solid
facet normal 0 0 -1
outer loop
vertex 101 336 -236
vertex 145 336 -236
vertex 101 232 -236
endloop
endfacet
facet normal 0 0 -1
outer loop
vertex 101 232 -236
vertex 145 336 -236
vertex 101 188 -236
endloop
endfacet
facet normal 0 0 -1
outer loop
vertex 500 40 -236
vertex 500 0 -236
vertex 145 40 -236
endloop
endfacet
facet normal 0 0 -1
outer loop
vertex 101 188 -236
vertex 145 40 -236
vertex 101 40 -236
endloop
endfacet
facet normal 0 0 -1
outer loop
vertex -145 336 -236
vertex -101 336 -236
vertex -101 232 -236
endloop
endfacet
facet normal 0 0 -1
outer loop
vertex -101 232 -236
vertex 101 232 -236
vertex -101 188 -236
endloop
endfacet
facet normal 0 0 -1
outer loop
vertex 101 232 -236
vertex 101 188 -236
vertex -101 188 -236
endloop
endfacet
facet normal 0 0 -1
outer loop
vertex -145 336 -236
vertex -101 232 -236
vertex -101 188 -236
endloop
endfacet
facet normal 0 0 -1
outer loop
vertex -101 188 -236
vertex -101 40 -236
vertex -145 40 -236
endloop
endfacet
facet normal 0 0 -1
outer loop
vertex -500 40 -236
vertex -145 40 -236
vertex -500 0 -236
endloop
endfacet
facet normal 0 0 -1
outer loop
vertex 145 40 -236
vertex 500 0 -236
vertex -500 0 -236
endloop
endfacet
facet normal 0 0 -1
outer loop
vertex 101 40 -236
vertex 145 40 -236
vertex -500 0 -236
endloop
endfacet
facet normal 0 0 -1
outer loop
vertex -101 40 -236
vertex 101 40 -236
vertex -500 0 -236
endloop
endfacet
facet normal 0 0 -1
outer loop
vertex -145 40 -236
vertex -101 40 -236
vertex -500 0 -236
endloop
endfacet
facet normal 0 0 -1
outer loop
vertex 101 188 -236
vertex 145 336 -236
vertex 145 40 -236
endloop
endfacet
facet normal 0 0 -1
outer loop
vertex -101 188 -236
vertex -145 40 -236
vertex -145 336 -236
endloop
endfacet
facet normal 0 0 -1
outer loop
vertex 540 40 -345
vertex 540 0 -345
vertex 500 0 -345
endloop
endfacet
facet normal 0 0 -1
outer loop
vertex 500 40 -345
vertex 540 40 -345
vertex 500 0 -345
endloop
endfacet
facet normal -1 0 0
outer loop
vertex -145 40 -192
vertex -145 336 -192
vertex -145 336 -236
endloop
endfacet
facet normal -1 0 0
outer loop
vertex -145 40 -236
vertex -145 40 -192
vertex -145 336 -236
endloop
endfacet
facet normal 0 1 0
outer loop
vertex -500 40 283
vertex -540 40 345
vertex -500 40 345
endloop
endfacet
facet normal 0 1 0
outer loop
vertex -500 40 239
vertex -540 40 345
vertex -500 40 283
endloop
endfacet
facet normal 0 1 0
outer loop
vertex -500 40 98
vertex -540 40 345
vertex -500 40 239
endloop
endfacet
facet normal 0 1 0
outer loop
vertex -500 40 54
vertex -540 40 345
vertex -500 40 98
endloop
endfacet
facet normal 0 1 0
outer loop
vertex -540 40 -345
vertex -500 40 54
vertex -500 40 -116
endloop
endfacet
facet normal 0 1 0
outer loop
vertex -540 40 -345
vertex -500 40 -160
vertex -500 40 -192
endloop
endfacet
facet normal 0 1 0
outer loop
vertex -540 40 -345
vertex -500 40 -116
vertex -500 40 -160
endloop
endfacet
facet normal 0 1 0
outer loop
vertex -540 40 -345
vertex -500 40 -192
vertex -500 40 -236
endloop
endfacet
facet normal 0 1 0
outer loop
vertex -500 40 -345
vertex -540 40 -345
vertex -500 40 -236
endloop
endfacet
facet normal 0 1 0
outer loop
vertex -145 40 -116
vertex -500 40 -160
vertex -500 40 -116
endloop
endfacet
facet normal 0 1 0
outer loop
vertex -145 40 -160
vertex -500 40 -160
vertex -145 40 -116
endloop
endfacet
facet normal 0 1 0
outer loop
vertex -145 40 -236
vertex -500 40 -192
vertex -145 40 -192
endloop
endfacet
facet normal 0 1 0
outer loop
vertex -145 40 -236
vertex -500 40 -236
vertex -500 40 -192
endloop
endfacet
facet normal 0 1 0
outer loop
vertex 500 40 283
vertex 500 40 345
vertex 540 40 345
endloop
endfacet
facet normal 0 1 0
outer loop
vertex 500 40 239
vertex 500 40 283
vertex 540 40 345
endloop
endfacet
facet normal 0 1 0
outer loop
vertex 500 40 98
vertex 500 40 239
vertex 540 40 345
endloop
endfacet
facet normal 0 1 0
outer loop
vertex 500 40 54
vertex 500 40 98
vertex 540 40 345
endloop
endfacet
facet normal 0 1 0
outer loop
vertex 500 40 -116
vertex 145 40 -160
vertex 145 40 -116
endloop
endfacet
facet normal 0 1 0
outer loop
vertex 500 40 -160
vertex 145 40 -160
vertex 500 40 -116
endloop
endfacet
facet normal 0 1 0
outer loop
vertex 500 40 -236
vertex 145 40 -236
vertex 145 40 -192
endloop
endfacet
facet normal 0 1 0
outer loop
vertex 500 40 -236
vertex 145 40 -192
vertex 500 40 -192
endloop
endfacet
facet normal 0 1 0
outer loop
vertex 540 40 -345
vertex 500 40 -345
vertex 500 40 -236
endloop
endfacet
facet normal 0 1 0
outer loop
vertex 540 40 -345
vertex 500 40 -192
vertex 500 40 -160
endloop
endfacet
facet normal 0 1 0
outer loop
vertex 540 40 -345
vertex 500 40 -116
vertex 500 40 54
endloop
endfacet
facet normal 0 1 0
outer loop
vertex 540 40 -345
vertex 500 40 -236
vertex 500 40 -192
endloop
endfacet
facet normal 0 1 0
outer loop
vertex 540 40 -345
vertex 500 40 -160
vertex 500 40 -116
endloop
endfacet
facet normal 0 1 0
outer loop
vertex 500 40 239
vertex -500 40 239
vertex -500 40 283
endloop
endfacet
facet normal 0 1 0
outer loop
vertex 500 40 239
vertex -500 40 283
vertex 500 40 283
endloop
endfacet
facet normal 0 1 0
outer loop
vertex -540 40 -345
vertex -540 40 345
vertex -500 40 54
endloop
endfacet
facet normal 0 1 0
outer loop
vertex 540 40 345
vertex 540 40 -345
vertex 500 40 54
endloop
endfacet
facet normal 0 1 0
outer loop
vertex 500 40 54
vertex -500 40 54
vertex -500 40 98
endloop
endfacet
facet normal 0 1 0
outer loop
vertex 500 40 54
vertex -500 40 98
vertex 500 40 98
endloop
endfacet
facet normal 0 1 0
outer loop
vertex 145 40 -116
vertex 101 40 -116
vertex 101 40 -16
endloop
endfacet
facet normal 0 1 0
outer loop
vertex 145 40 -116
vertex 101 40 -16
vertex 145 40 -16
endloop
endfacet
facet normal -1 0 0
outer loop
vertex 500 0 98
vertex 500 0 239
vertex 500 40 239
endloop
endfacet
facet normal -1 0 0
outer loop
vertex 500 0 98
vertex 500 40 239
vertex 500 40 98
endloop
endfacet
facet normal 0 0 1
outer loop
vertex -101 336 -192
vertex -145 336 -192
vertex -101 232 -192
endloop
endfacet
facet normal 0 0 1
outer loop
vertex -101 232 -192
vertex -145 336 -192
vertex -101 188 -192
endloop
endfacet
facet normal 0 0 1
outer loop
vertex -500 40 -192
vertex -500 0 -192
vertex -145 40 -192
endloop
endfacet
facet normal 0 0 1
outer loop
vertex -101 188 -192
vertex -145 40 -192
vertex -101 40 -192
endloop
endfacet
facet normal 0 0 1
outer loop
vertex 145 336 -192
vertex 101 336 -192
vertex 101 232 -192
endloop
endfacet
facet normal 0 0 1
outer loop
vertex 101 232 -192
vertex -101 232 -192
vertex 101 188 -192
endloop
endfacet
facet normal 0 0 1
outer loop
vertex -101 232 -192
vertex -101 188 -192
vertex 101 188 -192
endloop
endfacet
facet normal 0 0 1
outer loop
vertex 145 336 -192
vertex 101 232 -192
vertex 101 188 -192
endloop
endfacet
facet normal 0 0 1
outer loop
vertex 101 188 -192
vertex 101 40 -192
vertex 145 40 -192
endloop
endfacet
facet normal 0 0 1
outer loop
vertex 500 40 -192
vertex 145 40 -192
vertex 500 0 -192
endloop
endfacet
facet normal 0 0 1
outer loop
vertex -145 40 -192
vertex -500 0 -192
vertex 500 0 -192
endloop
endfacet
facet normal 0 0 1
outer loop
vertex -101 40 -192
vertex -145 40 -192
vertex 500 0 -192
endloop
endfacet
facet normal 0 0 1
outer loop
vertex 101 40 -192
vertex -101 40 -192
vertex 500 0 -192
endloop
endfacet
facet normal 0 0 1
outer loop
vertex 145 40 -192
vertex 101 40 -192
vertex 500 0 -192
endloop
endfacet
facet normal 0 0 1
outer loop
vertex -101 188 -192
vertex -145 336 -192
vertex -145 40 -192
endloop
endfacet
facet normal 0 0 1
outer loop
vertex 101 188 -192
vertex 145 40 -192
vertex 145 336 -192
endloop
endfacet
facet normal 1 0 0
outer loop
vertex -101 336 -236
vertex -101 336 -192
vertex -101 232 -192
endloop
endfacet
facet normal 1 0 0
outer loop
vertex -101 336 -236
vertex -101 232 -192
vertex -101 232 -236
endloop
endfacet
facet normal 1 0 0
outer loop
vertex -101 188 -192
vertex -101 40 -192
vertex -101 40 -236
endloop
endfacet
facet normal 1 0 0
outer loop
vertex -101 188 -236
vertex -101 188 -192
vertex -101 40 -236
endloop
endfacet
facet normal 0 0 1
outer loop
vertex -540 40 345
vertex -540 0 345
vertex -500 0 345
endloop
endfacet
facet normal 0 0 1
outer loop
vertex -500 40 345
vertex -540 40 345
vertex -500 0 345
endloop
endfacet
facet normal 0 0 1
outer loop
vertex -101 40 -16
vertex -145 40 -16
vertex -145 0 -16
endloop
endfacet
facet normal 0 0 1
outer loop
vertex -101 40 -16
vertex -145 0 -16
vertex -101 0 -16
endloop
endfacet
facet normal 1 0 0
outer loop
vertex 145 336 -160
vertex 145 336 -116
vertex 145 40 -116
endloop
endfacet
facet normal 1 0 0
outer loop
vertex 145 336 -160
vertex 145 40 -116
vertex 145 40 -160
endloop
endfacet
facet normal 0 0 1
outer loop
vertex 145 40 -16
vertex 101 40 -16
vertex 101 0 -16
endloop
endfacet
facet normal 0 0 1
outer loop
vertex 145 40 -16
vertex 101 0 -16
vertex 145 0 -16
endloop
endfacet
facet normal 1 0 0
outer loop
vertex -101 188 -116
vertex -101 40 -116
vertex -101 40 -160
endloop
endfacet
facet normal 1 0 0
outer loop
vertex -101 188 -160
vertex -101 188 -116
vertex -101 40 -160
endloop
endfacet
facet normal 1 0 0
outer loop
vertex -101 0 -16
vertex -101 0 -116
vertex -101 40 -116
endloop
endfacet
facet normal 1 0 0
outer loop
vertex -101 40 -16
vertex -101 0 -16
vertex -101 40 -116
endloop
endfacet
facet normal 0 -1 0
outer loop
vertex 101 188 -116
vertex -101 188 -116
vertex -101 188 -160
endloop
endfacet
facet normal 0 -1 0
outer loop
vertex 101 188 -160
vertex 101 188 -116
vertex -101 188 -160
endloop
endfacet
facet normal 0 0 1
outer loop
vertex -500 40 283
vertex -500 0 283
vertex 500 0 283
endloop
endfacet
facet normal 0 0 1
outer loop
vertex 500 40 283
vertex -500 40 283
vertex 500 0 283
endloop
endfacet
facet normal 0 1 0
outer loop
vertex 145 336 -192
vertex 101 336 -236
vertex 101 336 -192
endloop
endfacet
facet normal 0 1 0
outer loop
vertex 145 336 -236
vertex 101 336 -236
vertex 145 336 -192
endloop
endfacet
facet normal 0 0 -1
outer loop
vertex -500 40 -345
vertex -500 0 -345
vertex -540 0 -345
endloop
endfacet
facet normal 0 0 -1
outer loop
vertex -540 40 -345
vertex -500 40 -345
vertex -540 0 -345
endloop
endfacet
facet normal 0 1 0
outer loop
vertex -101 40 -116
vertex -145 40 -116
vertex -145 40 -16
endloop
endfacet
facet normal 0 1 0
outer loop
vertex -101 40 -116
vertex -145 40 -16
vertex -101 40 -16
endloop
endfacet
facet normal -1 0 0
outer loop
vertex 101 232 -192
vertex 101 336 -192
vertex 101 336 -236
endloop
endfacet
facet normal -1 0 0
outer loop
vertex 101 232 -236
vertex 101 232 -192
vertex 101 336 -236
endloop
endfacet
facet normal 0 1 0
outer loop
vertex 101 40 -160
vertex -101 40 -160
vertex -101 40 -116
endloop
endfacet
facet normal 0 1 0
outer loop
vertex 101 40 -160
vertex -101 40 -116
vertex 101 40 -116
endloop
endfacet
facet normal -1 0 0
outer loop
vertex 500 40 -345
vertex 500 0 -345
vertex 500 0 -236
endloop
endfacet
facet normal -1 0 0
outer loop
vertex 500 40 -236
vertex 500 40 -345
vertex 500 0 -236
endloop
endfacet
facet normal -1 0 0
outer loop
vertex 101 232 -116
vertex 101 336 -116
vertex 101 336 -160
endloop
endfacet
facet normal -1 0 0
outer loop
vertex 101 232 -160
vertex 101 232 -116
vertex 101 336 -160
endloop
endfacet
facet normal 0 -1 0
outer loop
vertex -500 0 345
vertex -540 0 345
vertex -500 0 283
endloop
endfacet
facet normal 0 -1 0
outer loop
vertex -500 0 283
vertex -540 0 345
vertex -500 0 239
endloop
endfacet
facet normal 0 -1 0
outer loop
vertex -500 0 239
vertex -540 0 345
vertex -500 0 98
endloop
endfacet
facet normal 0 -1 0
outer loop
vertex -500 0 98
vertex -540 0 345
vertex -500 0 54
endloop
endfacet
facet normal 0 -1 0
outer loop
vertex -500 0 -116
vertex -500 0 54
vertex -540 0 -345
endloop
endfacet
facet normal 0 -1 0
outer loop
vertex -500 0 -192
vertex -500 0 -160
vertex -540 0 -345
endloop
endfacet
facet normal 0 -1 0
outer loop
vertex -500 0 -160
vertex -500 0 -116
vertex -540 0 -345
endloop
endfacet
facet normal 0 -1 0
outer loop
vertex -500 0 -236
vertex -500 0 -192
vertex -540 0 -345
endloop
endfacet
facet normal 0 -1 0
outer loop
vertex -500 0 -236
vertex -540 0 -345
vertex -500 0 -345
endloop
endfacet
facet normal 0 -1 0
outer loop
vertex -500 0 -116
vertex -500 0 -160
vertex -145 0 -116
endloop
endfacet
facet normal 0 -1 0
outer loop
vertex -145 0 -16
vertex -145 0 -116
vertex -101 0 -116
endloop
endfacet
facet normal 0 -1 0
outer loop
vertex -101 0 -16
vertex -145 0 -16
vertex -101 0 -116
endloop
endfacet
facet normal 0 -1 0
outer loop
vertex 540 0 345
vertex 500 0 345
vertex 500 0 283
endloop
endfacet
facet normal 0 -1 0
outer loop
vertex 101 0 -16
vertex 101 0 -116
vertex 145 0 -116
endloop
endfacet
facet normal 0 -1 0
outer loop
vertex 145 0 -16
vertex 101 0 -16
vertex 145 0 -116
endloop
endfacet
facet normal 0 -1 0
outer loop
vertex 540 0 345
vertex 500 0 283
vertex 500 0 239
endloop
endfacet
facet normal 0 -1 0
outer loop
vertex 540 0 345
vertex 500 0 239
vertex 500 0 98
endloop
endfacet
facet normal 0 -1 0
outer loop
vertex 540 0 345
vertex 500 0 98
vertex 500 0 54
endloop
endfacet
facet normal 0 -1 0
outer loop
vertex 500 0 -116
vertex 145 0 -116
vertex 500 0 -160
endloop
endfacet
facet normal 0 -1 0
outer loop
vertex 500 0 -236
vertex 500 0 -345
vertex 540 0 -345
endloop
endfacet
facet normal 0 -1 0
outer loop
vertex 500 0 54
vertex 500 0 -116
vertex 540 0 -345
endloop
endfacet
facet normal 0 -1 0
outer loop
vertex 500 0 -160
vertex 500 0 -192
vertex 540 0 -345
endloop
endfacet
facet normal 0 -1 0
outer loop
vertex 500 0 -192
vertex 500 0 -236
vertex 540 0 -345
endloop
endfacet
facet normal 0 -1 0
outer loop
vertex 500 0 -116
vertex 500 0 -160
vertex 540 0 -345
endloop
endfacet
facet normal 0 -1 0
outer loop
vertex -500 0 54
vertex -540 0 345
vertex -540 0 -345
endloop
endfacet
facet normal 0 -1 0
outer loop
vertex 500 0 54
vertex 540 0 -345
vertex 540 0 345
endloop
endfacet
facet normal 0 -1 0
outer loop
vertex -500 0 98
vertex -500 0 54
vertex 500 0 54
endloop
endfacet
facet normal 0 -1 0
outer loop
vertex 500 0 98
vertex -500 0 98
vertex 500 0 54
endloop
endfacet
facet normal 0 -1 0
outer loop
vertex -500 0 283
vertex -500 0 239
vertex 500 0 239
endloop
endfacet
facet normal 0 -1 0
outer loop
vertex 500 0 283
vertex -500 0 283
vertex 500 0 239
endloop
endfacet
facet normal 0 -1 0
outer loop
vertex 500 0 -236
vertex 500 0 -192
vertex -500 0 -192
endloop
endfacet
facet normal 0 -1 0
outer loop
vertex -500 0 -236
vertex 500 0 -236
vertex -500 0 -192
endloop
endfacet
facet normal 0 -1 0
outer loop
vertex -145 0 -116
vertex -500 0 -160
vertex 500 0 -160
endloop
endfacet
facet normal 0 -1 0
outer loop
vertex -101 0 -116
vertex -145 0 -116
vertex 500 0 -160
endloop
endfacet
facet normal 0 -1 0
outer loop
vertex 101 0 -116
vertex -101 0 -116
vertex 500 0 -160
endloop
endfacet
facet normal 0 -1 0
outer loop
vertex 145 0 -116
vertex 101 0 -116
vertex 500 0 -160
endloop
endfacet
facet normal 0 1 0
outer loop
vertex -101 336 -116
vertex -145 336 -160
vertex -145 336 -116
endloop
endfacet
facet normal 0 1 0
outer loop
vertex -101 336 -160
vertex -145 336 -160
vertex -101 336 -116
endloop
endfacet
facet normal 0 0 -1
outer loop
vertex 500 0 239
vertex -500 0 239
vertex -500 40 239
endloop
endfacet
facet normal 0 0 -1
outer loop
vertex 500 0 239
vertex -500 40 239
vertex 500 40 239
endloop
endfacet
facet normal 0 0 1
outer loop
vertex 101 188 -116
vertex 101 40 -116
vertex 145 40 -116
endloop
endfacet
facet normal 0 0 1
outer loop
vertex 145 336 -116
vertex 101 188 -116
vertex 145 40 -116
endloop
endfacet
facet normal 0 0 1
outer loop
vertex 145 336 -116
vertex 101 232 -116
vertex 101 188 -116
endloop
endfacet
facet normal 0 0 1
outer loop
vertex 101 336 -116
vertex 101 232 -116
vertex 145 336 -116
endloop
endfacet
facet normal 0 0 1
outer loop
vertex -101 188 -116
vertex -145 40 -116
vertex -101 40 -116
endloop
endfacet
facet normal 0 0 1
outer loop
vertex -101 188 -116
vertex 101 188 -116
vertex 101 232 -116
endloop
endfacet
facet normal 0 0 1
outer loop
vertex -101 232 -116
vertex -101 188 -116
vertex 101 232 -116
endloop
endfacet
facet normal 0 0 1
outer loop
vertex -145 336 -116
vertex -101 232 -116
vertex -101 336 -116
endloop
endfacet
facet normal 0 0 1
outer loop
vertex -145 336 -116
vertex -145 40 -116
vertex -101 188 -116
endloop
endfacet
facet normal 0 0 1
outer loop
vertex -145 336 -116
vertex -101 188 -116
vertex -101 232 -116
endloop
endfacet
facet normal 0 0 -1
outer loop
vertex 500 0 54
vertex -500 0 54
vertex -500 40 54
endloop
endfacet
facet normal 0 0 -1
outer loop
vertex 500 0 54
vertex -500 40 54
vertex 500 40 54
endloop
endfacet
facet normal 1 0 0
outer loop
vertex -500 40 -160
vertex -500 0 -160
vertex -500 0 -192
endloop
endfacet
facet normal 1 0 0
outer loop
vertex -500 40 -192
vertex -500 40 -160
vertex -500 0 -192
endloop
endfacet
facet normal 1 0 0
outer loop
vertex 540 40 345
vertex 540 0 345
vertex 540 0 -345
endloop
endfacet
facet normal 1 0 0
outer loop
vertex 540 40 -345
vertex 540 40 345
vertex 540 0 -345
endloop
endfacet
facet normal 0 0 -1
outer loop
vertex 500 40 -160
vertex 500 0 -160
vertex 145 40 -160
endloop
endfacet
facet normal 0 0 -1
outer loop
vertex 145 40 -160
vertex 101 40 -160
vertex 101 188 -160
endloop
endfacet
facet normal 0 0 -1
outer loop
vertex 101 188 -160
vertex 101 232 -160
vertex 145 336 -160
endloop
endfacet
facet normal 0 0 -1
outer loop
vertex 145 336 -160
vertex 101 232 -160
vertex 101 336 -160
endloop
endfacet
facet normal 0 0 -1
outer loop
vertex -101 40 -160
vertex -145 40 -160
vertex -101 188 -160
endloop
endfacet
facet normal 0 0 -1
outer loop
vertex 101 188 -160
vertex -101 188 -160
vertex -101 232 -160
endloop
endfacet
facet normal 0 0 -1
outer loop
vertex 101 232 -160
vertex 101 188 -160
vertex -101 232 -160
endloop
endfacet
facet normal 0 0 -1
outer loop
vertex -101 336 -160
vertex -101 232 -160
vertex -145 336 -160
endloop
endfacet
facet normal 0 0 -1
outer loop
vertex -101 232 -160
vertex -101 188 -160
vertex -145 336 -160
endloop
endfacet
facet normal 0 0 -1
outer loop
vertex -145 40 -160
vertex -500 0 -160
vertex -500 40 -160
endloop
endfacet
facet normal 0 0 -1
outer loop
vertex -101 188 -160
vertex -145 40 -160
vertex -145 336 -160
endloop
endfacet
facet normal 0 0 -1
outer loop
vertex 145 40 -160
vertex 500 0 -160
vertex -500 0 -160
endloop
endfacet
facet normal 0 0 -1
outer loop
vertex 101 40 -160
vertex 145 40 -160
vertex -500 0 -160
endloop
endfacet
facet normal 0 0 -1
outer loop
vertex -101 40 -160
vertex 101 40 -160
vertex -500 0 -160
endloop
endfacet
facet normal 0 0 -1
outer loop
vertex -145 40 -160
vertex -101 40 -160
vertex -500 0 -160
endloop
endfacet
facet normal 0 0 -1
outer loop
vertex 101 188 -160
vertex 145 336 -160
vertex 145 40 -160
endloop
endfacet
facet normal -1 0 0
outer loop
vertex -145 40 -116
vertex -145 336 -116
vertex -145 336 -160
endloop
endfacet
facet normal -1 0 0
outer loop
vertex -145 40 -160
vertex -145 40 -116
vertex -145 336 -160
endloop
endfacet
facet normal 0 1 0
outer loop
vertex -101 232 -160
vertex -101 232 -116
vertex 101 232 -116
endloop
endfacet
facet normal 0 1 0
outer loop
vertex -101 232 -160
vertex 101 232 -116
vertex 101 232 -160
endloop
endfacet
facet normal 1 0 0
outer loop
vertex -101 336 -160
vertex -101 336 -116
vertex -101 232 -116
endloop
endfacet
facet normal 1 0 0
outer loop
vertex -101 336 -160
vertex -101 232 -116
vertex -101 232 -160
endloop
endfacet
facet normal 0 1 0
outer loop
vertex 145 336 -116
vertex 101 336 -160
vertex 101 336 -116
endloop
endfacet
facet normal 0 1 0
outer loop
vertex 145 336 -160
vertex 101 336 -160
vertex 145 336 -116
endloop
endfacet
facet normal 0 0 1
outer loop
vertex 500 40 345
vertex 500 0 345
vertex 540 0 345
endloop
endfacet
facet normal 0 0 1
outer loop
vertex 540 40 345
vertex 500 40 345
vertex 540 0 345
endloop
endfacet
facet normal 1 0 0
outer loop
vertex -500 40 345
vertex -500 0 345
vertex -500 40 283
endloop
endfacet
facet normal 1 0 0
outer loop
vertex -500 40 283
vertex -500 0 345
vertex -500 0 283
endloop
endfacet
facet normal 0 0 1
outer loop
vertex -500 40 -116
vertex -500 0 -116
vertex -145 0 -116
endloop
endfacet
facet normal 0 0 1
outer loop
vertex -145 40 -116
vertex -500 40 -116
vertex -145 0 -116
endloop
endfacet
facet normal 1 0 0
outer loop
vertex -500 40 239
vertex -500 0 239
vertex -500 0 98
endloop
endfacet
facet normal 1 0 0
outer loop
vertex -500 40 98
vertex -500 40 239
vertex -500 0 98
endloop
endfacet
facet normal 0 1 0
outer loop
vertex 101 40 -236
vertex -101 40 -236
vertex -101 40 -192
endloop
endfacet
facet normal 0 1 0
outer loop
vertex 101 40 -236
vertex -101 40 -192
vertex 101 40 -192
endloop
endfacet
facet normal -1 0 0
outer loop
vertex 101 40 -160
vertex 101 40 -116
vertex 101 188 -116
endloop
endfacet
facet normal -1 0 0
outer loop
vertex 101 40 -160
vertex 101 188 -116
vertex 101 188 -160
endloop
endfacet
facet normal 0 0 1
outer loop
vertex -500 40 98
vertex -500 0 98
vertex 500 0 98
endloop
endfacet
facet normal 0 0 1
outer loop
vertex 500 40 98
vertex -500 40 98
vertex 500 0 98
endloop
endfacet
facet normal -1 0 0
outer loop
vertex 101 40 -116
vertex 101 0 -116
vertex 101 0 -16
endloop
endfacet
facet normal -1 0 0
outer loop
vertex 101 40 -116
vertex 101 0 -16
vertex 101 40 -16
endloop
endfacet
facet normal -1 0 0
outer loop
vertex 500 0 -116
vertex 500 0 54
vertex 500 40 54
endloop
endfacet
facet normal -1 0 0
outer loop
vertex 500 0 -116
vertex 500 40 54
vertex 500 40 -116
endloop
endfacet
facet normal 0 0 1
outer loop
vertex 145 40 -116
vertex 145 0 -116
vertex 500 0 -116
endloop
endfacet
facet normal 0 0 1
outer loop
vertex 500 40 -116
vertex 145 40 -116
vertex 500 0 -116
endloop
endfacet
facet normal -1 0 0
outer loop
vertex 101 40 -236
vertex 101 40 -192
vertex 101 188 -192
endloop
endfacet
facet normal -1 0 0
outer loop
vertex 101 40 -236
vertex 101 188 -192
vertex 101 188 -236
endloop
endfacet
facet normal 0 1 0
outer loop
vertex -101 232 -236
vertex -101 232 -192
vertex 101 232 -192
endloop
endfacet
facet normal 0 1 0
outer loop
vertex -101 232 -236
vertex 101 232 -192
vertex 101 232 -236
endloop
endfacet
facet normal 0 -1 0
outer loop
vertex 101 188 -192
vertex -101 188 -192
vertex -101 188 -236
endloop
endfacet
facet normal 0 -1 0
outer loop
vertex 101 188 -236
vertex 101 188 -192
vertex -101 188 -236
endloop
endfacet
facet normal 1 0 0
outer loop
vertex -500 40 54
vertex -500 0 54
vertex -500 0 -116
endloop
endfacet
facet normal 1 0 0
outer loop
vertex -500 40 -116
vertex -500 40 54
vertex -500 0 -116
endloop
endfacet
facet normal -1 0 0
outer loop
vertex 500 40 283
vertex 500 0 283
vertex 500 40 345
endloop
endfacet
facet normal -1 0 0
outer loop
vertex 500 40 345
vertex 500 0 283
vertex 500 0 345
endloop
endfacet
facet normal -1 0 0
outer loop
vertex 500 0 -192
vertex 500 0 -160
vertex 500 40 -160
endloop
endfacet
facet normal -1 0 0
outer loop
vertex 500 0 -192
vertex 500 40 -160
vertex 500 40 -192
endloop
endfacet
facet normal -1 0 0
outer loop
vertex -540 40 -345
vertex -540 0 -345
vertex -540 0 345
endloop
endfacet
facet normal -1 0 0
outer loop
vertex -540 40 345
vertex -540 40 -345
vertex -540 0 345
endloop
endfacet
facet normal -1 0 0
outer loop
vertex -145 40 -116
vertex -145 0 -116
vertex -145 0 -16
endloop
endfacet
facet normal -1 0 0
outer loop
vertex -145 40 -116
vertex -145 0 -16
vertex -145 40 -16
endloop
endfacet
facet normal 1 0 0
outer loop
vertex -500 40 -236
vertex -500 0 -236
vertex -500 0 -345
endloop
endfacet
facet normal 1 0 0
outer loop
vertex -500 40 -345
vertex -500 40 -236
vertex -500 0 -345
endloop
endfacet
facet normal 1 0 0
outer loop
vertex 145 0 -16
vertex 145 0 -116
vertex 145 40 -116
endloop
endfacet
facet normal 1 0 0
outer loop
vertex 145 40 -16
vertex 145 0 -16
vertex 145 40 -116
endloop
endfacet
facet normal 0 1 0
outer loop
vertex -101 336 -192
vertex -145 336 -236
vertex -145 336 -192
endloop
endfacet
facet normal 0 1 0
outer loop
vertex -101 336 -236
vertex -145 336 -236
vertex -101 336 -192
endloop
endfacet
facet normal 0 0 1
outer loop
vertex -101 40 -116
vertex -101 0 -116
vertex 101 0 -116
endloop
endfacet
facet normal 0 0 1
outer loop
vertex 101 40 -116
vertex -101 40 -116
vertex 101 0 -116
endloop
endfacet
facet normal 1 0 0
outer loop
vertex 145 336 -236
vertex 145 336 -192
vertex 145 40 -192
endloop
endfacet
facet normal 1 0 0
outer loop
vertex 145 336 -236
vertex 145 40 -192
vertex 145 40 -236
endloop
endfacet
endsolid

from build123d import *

# Parameters (mm, degrees)
SKETCH1_W           = 1000
SKETCH1_H           = 141
SKETCH1_H_2         = 170
SKETCH1_H_3         = 32
BOSS_EXTRUDE1_DEPTH = 40
SKETCH2_W           = 44
SKETCH2_H           = 44
BOSS_EXTRUDE2_DEPTH = 296
SKETCH3_W           = 44
SKETCH3_H           = 40
BOSS_EXTRUDE3_DEPTH = 100
SKETCH4_W           = 44
SKETCH4_H           = 44
BOSS_EXTRUDE4_DEPTH = 209


with BuildPart() as part:
    # Sketch1 → Boss-Extrude1 (new body)
    with BuildSketch(Plane(origin=(0, 0, 0), x_dir=(1, 0, 0), z_dir=(0, 1, 0))):
        Polygon((-500, 236), (-500, 345), (-540, 345), (-540, -345), (-500, -345), (-500, -283), (500, -283), (500, -345), (540, -345), (540, 345), (500, 345), (500, 236), align=None)
        with Locations((0, -168.5)):
            Rectangle(SKETCH1_W, SKETCH1_H, mode=Mode.SUBTRACT)
        with Locations((0, 31)):
            Rectangle(SKETCH1_W, SKETCH1_H_2, mode=Mode.SUBTRACT)
        with Locations((0, 176)):
            Rectangle(SKETCH1_W, SKETCH1_H_3, mode=Mode.SUBTRACT)
    extrude(amount=BOSS_EXTRUDE1_DEPTH)

    # Sketch2 → Boss-Extrude2 (add)
    with BuildSketch(Plane(origin=(0, 40, 0), x_dir=(1, 0, 0), z_dir=(0, 1, 0))):
        with Locations((-123, 214)):
            Rectangle(SKETCH2_W, SKETCH2_H)
        with Locations((123, 214)):
            Rectangle(SKETCH2_W, SKETCH2_H)
        with Locations((-123, 138)):
            Rectangle(SKETCH2_W, SKETCH2_H)
        with Locations((123, 138)):
            Rectangle(SKETCH2_W, SKETCH2_H)
    extrude(amount=BOSS_EXTRUDE2_DEPTH)

    # Sketch3 → Boss-Extrude3 (add)
    with BuildSketch(Plane.XY.offset(-116)):
        with Locations((-123, 20)):
            Rectangle(SKETCH3_W, SKETCH3_H)
        with Locations((123, 20)):
            Rectangle(SKETCH3_W, SKETCH3_H)
    extrude(amount=BOSS_EXTRUDE3_DEPTH)

    # Sketch4 → Boss-Extrude4 (add)
    with BuildSketch(Plane(origin=(-101, 0, 0), x_dir=(0, 0, -1), z_dir=(1, 0, 0))):
        with Locations((138, 210)):
            Rectangle(SKETCH4_W, SKETCH4_H)
        with Locations((214, 210)):
            Rectangle(SKETCH4_W, SKETCH4_H)
    extrude(amount=BOSS_EXTRUDE4_DEPTH)


solid = part.part
